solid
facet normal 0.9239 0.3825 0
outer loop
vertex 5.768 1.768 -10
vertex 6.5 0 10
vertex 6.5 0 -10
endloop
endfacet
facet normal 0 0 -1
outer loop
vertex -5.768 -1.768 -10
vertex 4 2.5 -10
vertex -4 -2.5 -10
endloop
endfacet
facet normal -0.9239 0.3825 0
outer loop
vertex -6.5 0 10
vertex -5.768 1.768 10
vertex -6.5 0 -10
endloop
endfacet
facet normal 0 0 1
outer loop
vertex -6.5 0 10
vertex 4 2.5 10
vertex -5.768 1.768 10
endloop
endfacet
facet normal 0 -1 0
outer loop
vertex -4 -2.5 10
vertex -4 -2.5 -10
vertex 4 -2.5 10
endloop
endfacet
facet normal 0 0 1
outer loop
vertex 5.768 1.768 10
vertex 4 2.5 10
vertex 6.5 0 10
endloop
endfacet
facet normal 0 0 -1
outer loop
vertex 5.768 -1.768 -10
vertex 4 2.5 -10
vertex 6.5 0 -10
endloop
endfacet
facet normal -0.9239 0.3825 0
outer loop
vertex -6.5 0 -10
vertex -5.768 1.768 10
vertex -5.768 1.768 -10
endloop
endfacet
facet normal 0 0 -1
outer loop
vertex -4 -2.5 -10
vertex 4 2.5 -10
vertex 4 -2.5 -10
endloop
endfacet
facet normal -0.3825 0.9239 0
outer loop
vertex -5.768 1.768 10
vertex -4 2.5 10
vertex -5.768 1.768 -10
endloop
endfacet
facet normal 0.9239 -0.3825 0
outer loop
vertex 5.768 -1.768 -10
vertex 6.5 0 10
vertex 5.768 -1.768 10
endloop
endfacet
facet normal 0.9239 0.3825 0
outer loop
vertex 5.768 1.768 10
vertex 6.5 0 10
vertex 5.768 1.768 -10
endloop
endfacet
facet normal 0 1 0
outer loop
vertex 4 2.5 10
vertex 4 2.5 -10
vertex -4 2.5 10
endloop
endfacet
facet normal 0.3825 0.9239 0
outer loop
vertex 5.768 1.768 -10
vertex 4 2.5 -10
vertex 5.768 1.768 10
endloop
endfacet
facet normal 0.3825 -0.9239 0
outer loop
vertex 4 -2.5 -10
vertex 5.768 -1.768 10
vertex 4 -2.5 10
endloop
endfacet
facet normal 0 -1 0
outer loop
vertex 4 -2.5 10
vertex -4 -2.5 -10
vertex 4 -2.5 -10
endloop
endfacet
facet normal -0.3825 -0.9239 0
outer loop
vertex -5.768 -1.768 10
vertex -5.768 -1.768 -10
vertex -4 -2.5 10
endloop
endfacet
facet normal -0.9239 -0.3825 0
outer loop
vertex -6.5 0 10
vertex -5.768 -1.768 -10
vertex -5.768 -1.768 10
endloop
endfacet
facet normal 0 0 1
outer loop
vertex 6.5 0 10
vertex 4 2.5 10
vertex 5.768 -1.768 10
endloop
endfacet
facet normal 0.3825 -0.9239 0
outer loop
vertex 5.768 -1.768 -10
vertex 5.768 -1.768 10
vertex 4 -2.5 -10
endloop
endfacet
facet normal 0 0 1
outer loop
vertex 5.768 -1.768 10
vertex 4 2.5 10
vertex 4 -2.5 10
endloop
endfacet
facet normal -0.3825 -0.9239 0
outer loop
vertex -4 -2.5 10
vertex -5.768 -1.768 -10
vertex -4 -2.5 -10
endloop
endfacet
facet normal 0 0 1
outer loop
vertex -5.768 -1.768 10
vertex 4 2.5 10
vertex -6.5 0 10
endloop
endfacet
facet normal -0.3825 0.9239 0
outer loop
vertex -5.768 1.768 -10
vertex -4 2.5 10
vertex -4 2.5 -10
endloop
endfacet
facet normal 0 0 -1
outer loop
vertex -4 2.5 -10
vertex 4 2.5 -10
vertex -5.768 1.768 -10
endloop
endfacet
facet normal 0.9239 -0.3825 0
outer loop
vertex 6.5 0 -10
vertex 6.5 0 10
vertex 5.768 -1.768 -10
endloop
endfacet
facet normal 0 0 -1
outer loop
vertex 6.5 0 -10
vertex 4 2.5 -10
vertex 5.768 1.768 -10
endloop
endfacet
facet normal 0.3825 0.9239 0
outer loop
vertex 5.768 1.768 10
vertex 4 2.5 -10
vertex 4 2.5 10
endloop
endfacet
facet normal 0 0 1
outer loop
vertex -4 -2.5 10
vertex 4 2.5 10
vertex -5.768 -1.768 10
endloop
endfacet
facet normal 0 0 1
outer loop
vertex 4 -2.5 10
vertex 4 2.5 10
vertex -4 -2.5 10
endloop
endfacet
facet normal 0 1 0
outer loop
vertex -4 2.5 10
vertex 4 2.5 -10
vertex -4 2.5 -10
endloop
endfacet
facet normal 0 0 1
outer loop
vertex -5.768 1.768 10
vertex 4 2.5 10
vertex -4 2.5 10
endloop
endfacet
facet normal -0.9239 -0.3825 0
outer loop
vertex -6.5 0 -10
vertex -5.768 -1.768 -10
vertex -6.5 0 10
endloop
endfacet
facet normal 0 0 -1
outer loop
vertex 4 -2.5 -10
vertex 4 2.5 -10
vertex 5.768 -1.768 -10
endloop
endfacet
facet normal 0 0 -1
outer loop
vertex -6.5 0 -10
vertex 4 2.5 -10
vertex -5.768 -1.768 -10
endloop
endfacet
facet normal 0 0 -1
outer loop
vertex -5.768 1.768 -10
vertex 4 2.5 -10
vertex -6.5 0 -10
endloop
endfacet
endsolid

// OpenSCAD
use <shortcuts.scad>

langloch();
*henkel();

module langloch(r=2.5,d=8,h=20)
{
	hull() {
	Tx(-d/2) Cy(r=r, h=h);
	Tx(+d/2) Cy(r=r, h=h);
	}
}
	
module rounded_box(l,b,h,r,w)
{
	ri=r-w;
	off1=-w*2;
	off2=0;
	D() {
		rounded_cube(l=l+off2, b=b+off2, h=h+off2, r=r);
		rounded_cube(l=l+off1, b=b+off1, h=h+off1, r=ri);
	}
}


module rounded_cube(l,b,h,r)
{
	T(-l/2+r, -b/2+r, -h/2+r) { 
		d=2*r;
		hull() {
			Sp(r=r);
			Tx(l-d) Sp(r=r);
			Ty(b-d) Sp(r=r);
			Ty(b-d) Tx(l-d) Sp(r=r);
			Tz(h-d) Sp(r=r);
			Tz(h-d) Tx(l-d) Sp(r=r);
			Tz(h-d) Ty(b-d) Sp(r=r);
			Tz(h-d) Ty(b-d) Tx(l-d) Sp(r=r);
		}
	}
}

module zeppelin(r=5,h=20)
{
	Tz(h/2-r)    Sp(r=r);
	Tz(0)        Cy(r=r, h=h-2*r);
	Tz(-(h/2-r)) Sp(r=r);
}

module henkel(
	h=20,
	b=5,
	ri=10,
	rr=2,
	L=200,
	H=50
)
{
	lm=L-2*ri-4*rr-2*b;
	hm=H-ri-b-2*rr;

	Ty(hm-H/2) {
	henkel_halb();
	Mx(1)
		henkel_halb();
	}
	module henkel_halb()
	{
	Tx(lm/2) 
		rounded_ring(ri=ri, h=h, b=b, rr=rr, w=90);
	Ty(ri+b/2+rr/2) 
		rounded_block(h=h, b=b, l=lm, rr=rr);
	Ty(-hm/2) Tx(L/2-b/2-rr-rr/2) Rz(90) 
		rounded_block(h=h, b=b, l=hm, rr=rr);
	}
}


module rounded_ring(ri=100, h=50, b=10, rr=10, w=360)
{
	r=ri+rr/2;
	Tz(-h/2)
rotate_extrude(convexity = 10, angle=w) 
	Tx(r) { 
		Ci(r = rr) ;
		Ty(h) Ci(r=rr);
		Tx(b) Ci(r=rr);
		Tx(b) Ty(h) Ci(r=rr);
		Tx(b/2) Ty(h/2) square([b,2*rr+h], center=true);
		Tx(b/2) Ty(h/2) square([b+2*rr,h], center=true);
		
		
		}
}


module rounded_block(l=100, h=50, b=10, rr=10)
{
	Rx(90) Ry(90) Tx(-b/2) Tz(-l/2) Ty(-h/2) 
	linear_extrude(height=l) 
	{ 
		Ci(r = rr) ;
		Ty(h) Ci(r=rr);
		Tx(b) Ci(r=rr);
		Tx(b) Ty(h) Ci(r=rr);
		Tx(b/2) Ty(h/2) square([b,2*rr+h], center=true);
		Tx(b/2) Ty(h/2) square([b+2*rr,h], center=true);
		
		
		}
}
